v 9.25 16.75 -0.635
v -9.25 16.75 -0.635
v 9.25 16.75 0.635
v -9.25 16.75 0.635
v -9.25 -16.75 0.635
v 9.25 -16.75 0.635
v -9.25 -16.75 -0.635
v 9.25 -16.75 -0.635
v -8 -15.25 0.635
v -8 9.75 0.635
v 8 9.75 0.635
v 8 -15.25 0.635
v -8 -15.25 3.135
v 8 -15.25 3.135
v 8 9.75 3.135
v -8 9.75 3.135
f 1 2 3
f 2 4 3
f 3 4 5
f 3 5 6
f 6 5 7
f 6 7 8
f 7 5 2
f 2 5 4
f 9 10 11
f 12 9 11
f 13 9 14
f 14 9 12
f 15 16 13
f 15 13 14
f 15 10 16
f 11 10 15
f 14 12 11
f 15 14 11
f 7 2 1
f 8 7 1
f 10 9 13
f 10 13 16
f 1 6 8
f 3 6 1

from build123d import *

# Parameters (mm, degrees)
F0_W     = 18.5
F0_H     = 33.5
F1_DEPTH = 0.635
F2_W     = 16
F2_H     = 25
F3_DEPTH = 2.5


with BuildPart() as f1:
    # F0 (on Top) → F1 (new body, symmetric)
    with BuildSketch(Plane.XY):
        Rectangle(F0_W, F0_H)
    extrude(amount=F1_DEPTH, both=True)


with BuildPart() as f3:
    # F2 (on face) → F3 (new body)
    with BuildSketch(Plane.XY.offset(0.635)):
        with Locations((0, -2.75)):
            Rectangle(F2_W, F2_H)
    extrude(amount=F3_DEPTH)


solid = Compound([f1.part, f3.part])
